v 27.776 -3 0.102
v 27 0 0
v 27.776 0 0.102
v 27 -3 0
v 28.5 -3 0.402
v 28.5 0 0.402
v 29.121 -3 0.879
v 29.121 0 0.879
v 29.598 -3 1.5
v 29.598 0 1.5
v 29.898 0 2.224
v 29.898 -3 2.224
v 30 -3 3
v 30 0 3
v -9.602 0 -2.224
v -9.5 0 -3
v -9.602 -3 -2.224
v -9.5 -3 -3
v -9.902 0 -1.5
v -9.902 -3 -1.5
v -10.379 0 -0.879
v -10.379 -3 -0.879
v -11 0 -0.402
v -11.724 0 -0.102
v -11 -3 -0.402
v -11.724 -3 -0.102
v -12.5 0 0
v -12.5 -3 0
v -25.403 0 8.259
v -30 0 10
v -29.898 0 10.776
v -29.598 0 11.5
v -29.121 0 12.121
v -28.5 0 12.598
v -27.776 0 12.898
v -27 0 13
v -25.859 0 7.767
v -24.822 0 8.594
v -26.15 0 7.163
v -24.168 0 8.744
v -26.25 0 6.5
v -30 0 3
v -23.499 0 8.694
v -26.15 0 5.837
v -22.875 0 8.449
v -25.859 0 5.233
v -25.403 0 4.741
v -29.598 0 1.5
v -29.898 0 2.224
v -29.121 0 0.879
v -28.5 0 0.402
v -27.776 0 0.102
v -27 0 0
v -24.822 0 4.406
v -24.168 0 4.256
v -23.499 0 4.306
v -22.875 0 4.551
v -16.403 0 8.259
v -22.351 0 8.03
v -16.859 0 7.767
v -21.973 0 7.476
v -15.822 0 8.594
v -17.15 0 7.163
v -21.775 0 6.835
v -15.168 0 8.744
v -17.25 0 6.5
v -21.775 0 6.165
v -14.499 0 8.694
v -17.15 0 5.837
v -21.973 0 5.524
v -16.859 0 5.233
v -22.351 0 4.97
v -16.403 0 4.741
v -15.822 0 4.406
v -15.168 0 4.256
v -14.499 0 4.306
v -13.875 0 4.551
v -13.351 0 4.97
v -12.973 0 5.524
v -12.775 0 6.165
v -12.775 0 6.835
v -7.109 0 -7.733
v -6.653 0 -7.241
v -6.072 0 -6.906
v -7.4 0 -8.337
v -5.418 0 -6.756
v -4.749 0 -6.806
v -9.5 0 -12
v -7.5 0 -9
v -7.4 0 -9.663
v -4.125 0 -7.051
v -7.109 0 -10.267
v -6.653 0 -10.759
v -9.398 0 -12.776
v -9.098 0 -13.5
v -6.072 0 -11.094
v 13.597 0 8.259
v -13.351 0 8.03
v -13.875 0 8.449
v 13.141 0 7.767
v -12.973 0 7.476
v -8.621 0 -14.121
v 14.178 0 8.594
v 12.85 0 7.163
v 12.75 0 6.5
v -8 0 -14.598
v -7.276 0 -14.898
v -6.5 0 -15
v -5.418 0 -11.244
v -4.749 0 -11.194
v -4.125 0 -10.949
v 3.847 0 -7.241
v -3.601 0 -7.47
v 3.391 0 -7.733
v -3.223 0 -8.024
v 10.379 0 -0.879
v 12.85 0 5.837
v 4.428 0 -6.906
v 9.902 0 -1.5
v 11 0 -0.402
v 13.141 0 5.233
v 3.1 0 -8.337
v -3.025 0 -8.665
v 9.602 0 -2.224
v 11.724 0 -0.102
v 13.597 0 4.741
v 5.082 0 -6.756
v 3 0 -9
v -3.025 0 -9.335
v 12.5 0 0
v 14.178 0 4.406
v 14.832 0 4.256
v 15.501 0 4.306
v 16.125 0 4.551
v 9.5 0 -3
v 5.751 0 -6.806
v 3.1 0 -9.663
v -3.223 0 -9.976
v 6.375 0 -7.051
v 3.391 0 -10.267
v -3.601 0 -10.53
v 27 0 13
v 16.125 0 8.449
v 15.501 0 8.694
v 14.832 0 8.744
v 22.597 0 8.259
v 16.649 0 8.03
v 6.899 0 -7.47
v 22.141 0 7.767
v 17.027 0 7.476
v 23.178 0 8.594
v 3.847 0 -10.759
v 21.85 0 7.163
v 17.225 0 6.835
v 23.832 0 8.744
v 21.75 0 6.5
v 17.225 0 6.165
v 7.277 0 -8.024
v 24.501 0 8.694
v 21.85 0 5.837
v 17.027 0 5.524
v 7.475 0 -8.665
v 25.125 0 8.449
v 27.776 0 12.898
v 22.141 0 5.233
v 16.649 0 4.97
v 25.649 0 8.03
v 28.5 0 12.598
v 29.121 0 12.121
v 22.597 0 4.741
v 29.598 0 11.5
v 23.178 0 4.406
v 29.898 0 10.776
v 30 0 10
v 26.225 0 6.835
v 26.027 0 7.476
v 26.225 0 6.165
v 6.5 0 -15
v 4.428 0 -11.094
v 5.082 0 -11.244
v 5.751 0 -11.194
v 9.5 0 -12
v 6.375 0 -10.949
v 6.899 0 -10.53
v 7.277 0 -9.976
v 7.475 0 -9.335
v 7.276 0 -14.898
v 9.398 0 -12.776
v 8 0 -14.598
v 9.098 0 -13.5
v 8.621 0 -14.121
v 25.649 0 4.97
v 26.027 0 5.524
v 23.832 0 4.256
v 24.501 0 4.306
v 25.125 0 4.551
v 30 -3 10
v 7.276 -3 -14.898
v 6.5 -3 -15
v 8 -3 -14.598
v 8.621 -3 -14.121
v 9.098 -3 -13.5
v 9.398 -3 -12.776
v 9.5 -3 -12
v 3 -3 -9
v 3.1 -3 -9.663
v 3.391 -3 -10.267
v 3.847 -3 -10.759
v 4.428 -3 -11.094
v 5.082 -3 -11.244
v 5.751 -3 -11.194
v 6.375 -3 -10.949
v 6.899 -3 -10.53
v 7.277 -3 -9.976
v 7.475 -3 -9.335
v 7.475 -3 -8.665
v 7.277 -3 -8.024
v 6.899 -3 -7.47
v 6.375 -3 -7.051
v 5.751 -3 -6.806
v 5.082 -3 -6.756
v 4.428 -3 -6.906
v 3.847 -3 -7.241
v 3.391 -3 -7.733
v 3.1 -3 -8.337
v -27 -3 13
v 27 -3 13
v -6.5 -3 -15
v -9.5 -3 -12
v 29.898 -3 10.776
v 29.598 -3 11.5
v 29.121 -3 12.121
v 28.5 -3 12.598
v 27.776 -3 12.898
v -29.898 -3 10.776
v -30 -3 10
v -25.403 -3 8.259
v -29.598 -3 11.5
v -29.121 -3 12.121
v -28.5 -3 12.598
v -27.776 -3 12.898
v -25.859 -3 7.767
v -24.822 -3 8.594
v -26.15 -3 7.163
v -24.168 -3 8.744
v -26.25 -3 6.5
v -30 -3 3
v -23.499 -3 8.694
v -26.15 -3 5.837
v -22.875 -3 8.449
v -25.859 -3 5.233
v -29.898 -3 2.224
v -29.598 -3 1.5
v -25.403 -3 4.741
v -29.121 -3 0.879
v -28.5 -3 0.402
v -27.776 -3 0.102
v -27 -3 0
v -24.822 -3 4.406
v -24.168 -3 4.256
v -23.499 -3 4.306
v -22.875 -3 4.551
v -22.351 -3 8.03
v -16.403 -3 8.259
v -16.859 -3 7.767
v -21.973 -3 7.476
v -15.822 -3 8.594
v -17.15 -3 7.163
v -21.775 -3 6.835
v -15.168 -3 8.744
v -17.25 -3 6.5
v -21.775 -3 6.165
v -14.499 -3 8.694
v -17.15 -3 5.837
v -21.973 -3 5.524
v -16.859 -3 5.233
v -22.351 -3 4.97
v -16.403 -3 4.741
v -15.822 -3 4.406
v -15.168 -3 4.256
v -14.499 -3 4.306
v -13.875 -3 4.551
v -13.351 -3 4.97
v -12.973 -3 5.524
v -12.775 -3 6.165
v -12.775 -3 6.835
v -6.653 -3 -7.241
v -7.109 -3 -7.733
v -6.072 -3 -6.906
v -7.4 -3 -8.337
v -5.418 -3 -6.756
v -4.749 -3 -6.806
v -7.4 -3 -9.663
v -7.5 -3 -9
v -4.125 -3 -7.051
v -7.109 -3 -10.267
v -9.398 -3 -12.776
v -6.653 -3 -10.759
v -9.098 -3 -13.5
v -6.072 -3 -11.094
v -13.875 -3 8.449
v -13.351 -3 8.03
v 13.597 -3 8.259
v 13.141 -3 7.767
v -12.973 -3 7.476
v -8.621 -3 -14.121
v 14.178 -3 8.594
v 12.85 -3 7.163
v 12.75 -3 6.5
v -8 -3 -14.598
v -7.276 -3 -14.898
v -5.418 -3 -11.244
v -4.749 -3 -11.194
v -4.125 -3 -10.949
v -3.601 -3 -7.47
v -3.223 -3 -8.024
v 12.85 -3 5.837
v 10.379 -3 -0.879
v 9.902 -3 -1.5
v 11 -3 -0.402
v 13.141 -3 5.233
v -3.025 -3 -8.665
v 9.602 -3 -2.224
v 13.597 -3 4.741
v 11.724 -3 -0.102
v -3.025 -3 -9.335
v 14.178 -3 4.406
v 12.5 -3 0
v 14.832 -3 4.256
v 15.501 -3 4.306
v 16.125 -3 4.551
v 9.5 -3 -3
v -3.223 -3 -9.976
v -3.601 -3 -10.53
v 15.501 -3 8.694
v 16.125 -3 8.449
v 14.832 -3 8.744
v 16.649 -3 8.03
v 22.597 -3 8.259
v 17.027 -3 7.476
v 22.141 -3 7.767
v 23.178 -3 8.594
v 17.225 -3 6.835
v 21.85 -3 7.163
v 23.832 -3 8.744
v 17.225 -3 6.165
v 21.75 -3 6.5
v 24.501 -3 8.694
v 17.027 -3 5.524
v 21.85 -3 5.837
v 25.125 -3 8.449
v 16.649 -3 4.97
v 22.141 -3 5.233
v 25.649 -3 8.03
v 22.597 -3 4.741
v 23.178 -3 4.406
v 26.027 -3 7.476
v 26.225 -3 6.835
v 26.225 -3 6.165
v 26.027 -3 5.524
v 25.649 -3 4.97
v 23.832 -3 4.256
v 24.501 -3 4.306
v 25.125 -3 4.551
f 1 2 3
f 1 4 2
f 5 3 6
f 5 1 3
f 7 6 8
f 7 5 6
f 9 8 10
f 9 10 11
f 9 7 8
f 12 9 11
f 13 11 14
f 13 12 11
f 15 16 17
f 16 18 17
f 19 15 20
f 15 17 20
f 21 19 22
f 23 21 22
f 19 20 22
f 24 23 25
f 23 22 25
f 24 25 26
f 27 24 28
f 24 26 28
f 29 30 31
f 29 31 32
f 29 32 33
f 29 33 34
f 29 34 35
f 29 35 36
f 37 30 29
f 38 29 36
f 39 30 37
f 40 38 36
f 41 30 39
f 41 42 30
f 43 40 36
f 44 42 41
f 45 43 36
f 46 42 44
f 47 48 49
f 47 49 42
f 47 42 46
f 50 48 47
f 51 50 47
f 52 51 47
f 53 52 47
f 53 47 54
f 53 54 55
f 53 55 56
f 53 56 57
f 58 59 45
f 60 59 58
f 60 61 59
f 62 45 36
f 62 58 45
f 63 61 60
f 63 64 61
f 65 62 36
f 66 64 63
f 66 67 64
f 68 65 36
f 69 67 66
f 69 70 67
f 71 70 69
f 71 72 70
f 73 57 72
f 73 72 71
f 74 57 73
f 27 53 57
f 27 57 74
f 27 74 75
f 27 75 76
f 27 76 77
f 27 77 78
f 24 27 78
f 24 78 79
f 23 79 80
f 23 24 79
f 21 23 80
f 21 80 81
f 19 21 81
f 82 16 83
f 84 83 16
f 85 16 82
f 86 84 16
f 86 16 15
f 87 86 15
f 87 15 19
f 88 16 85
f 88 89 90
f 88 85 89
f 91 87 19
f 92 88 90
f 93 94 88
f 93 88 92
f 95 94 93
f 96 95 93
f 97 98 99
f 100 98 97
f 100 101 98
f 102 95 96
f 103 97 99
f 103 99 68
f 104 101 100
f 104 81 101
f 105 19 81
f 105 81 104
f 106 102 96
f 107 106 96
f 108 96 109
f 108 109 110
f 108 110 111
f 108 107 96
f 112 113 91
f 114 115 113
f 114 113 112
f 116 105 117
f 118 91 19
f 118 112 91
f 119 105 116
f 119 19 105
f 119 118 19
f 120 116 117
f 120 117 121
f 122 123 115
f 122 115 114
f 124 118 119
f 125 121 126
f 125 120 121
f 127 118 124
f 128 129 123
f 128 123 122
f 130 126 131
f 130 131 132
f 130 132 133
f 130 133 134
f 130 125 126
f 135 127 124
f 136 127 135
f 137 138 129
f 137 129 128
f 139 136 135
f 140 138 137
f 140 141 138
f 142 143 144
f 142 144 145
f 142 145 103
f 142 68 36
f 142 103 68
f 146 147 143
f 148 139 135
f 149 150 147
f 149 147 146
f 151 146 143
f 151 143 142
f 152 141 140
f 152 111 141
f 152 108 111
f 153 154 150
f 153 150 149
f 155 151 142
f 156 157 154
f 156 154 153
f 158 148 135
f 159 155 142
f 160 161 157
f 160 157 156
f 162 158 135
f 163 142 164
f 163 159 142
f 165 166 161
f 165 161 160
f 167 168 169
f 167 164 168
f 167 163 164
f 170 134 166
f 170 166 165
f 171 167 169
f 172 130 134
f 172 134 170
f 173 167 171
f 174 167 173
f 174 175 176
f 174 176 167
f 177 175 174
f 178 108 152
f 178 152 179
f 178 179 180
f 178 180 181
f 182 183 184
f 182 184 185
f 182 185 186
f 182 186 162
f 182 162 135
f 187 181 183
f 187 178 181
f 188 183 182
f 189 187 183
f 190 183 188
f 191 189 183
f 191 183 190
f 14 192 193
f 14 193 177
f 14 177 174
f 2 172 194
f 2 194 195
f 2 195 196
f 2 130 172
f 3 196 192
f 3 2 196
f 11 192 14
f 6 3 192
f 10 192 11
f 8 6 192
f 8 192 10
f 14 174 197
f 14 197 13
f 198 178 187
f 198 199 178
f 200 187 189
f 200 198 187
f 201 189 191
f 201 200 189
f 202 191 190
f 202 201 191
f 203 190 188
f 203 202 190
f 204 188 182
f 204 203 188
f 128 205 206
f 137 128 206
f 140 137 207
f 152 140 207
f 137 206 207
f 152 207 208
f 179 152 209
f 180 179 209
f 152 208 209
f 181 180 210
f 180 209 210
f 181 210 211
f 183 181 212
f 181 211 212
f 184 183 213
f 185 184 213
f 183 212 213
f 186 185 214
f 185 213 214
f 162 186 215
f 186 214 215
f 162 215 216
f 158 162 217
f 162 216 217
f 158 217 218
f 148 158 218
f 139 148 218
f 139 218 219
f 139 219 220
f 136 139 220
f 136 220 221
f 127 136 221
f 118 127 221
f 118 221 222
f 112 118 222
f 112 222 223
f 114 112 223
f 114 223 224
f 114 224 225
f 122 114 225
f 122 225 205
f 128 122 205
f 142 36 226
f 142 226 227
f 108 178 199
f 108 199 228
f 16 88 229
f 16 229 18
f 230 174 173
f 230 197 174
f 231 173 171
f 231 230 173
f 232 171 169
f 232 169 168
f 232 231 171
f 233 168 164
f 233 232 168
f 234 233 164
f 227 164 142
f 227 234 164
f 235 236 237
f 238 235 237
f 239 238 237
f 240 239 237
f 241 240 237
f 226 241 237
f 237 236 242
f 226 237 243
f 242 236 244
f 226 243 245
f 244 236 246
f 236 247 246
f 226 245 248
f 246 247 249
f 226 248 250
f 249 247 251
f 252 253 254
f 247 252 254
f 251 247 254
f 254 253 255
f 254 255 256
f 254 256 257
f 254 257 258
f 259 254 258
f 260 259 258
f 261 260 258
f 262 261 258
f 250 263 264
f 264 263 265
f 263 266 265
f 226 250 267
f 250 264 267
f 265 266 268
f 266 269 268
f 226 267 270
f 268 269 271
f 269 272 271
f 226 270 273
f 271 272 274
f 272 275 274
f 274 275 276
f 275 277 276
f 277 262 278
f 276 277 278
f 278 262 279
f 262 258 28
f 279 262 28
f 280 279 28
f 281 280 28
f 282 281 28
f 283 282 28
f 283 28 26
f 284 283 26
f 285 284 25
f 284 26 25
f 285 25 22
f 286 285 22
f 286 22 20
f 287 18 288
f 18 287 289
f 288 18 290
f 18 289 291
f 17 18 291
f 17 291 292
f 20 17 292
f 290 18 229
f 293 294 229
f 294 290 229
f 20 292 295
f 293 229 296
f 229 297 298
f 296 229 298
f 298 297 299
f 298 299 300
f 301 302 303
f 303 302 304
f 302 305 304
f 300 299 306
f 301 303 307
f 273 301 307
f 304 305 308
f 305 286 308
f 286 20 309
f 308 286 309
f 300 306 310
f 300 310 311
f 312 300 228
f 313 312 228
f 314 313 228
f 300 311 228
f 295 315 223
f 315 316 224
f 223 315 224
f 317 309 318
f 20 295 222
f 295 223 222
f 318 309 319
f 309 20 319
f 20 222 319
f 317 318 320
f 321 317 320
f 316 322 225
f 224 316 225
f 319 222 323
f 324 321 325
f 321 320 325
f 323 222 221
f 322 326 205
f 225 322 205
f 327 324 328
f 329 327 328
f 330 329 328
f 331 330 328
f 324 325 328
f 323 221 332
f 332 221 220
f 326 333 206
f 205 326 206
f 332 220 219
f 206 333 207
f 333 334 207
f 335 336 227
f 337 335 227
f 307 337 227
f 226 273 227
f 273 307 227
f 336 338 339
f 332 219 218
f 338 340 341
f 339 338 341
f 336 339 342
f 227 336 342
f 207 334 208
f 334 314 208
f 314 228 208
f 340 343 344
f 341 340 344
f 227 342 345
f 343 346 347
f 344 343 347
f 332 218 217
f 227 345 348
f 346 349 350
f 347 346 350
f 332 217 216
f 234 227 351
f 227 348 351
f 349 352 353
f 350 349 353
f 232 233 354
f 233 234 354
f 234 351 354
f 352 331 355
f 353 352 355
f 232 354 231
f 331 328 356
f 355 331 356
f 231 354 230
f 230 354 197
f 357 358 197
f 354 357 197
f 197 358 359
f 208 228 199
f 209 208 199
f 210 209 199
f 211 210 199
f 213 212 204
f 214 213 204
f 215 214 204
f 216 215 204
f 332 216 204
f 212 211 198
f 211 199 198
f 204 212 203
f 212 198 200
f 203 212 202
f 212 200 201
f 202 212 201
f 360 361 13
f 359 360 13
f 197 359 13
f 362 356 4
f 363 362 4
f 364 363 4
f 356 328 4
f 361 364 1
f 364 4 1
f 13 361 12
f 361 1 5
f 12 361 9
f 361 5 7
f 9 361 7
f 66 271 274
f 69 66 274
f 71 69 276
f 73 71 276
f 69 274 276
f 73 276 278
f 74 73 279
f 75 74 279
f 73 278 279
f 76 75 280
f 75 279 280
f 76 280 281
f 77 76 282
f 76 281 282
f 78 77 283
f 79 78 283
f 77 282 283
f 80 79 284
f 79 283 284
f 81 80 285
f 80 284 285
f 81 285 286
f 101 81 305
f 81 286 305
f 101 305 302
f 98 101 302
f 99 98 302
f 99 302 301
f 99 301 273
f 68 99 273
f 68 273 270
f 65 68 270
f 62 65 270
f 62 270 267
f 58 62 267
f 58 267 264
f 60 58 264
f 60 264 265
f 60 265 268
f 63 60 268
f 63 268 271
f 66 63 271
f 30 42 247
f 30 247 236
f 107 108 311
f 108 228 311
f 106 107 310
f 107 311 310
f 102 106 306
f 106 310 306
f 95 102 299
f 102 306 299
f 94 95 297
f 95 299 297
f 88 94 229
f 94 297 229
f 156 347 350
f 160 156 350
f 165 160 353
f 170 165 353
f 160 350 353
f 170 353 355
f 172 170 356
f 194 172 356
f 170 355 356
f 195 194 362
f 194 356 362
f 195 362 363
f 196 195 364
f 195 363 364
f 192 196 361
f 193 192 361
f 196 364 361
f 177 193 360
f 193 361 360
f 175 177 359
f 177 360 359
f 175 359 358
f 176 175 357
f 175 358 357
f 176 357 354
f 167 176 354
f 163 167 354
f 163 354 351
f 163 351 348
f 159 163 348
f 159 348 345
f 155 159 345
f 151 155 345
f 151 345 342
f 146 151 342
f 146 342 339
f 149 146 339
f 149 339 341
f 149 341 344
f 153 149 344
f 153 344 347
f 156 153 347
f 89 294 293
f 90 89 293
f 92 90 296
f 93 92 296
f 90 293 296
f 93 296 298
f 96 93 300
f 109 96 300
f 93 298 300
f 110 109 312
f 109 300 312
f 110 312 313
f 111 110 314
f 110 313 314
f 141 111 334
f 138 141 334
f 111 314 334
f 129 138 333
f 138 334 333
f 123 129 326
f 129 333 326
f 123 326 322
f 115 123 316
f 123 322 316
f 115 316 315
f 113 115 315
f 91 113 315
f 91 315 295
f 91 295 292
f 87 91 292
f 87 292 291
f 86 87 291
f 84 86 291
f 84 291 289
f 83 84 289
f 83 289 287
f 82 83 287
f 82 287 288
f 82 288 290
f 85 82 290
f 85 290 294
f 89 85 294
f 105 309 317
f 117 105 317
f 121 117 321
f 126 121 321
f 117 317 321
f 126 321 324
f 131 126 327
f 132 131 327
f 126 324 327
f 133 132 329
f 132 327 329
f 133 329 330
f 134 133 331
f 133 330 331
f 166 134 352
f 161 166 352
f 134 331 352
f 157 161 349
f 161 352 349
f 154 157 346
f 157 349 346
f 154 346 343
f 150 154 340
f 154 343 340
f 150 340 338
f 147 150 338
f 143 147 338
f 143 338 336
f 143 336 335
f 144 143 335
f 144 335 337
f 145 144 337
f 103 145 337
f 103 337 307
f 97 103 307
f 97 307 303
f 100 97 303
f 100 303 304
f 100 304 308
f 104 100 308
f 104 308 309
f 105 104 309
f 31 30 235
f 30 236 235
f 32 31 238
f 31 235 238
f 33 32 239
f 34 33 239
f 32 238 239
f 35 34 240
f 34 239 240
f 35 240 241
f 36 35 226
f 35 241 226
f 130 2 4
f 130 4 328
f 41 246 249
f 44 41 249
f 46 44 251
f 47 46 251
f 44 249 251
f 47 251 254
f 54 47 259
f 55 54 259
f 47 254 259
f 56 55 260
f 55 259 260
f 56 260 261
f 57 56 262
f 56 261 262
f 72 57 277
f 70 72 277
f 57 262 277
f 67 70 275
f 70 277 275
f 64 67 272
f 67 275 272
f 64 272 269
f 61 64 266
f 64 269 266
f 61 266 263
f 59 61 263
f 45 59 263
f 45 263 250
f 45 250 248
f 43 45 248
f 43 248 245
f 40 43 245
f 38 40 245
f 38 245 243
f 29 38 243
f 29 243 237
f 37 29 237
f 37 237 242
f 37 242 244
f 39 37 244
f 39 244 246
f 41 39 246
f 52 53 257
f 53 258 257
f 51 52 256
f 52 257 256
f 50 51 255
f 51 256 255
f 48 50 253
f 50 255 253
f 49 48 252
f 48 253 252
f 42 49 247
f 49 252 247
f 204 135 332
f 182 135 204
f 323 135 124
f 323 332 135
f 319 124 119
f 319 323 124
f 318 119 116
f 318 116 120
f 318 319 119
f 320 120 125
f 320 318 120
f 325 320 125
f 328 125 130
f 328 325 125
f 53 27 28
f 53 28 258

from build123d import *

# Parameters (mm, degrees)
ODGI_CIE_BAZOWE1_DEPTH  = 3
OTW_R_POD_RUB_M41_D     = 4.5
OTW_R_POD_RUB_M41_DEPTH = 10
OTW_R_POD_RUB_M41_TIP   = 1.351936393
ZAOKR_GLENIE1_R         = 3


# Sheet-metal steps are written as plain solids
with BuildPart() as part:
    # Szkic1 → Odgięcie bazowe1 (new body)
    with BuildSketch(Plane(origin=(0, 0, 0), x_dir=(1, 0, 0), z_dir=(0, 1, 0))):
        Polygon((9.5, 15), (-9.5, 15), (-9.5, 0), (-30, 0), (-30, -13), (30, -13), (30, 0), (9.5, 0), align=None)
    extrude(amount=-ODGI_CIE_BAZOWE1_DEPTH)

    # Otwór pod śrubę M41
    with Locations(Plane(origin=(0, 0, 0), x_dir=(1, 0, 0), z_dir=(0, 1, 0))):
        with Locations((-5.25, 9), (5.25, 9), (-15, -6.5), (15, -6.5), (-24, -6.5), (24, -6.5)):
            Hole(OTW_R_POD_RUB_M41_D / 2, depth=OTW_R_POD_RUB_M41_DEPTH)
            with Locations((0, 0, -(OTW_R_POD_RUB_M41_DEPTH + OTW_R_POD_RUB_M41_TIP / 2))):  # 118° drill point
                Cone(0, OTW_R_POD_RUB_M41_D / 2, OTW_R_POD_RUB_M41_TIP, mode=Mode.SUBTRACT)

    # Zaokrąglenie1
    zaokr_glenie1_edges = [part.edges().sort_by_distance(p)[0] for p in [
        (-9.5, -1.5, -15),
        (9.5, -1.5, -15),
        (9.5, -1.5, 0),
        (30, -1.5, 0),
        (30, -1.5, 13),
        (-30, -1.5, 13),
        (-30, -1.5, 0),
        (-9.5, -1.5, 0),
    ]]
    fillet(zaokr_glenie1_edges, radius=ZAOKR_GLENIE1_R)


solid = part.part
